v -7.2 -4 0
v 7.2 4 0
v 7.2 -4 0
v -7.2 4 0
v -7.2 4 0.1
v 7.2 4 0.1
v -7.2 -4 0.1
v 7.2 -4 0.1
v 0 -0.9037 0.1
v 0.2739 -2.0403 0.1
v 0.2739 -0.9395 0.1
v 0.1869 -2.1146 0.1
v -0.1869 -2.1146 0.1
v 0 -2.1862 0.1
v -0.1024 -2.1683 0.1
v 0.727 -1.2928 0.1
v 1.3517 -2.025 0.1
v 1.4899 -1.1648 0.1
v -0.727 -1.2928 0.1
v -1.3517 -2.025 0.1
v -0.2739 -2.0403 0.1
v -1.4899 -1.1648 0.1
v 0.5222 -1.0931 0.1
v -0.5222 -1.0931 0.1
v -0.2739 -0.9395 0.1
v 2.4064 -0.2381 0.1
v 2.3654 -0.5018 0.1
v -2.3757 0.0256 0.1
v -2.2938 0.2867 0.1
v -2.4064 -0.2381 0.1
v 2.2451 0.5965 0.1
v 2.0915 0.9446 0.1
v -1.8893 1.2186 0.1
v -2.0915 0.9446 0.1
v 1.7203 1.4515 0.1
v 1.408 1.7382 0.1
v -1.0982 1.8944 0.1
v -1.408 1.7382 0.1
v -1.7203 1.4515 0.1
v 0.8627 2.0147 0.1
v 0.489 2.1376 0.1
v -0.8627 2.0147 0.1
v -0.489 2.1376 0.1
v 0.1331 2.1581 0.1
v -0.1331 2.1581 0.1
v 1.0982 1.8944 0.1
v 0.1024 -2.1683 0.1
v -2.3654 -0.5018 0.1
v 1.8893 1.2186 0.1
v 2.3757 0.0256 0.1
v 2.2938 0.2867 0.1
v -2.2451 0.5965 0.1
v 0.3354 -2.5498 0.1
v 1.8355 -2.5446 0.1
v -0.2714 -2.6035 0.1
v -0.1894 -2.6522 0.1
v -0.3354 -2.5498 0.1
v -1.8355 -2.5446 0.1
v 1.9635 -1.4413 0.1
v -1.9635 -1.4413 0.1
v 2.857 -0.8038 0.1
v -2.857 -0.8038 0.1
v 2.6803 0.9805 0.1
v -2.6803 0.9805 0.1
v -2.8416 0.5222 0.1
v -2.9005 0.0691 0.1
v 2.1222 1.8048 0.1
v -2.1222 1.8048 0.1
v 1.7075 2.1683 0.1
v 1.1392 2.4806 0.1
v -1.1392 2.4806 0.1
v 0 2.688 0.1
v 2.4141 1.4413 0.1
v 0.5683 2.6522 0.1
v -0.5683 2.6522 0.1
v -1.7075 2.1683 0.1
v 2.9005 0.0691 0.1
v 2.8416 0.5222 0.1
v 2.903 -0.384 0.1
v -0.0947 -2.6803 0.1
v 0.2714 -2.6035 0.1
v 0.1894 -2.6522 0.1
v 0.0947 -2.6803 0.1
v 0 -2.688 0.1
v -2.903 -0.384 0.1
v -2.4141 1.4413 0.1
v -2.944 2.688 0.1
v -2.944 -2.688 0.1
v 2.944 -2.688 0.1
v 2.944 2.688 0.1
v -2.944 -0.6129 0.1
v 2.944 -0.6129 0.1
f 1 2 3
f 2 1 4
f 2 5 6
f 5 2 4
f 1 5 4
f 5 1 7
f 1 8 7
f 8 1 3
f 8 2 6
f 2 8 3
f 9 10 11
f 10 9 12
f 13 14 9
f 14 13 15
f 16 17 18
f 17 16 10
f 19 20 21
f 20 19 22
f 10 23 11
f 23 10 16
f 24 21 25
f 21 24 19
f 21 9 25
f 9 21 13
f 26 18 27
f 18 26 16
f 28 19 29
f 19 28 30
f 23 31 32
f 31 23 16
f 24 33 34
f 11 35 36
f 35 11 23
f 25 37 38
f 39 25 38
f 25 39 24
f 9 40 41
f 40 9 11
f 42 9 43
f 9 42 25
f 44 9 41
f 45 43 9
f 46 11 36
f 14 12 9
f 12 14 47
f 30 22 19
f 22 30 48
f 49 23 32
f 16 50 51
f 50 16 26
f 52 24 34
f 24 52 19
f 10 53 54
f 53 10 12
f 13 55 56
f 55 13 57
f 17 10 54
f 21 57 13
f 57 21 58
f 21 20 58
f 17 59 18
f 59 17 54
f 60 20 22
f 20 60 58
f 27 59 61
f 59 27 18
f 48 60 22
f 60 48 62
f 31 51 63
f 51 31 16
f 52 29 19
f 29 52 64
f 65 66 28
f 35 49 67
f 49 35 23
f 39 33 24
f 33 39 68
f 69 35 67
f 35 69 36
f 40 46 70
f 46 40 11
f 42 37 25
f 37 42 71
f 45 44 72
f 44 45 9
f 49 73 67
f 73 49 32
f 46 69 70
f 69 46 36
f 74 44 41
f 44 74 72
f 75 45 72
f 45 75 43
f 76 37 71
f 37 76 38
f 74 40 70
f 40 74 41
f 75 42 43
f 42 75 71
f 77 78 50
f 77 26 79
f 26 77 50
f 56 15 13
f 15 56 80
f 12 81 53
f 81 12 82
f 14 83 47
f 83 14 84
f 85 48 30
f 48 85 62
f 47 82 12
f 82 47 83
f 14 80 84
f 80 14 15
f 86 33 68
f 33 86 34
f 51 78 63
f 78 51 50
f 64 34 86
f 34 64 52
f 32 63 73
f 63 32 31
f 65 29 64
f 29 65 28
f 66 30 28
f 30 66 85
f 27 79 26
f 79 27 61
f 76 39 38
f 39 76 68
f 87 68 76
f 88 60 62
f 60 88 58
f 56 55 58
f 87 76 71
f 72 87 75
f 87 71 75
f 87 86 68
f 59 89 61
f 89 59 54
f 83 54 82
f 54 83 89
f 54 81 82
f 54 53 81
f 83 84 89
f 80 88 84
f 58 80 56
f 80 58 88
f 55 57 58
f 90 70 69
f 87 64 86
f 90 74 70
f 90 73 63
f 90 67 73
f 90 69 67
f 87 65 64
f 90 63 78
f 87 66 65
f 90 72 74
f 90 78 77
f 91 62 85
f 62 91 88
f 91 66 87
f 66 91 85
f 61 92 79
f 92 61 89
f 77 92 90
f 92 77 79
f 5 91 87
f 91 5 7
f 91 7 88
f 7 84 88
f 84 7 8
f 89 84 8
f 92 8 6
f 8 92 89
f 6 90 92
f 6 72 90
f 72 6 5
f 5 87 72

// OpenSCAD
// file: ../p/4-4edge.scad
use <../lib.scad>
$fa=1; $fs=0.2;
function ldraw_lib__4_4edge(realsolid=false) = [
// 0 Circle 1.0
// 0 Name: 4-4edge.dat
// 0 Author: James Jessiman
// 0 !LDRAW_ORG Primitive UPDATE 2017-01
// 0 !LICENSE Licensed under CC BY 2.0 and CC BY 4.0 : see CAreadme.txt
// 
// 0 BFC CERTIFY CCW
  [0,"BFC","CERTIFY"],
  [0,"BFC","CCW"],
// 
// 0 !HISTORY 1998-12-15 [PTadmin] Official Update 1998-10
// 0 !HISTORY 2005-12-28 [PTadmin] Official Update 2005-01
// 0 !HISTORY 2007-06-24 [PTadmin] Header formatted for Contributor Agreement
// 0 !HISTORY 2008-07-01 [PTadmin] Official Update 2008-01
// 0 !HISTORY 2017-01-15 [Steffen] BFCed
// 0 !HISTORY 2017-12-30 [PTadmin] Official Update 2017-01
// 
// 
// 2 24 1 0 0 0.9239 0 0.3827
  [2,24,1,0,0,0.9239,0,0.3827],
// 2 24 0.9239 0 0.3827 0.7071 0 0.7071
  [2,24,0.9239,0,0.3827,0.7071,0,0.7071],
// 2 24 0.7071 0 0.7071 0.3827 0 0.9239
  [2,24,0.7071,0,0.7071,0.3827,0,0.9239],
// 2 24 0.3827 0 0.9239 0 0 1
  [2,24,0.3827,0,0.9239,0,0,1],
// 2 24 0 0 1 -0.3827 0 0.9239
  [2,24,0,0,1,-0.3827,0,0.9239],
// 2 24 -0.3827 0 0.9239 -0.7071 0 0.7071
  [2,24,-0.3827,0,0.9239,-0.7071,0,0.7071],
// 2 24 -0.7071 0 0.7071 -0.9239 0 0.3827
  [2,24,-0.7071,0,0.7071,-0.9239,0,0.3827],
// 2 24 -0.9239 0 0.3827 -1 0 -0
  [2,24,-0.9239,0,0.3827,-1,0,-0],
// 2 24 -1 0 -0 -0.9239 0 -0.3827
  [2,24,-1,0,-0,-0.9239,0,-0.3827],
// 2 24 -0.9239 0 -0.3827 -0.7071 0 -0.7071
  [2,24,-0.9239,0,-0.3827,-0.7071,0,-0.7071],
// 2 24 -0.7071 0 -0.7071 -0.3827 0 -0.9239
  [2,24,-0.7071,0,-0.7071,-0.3827,0,-0.9239],
// 2 24 -0.3827 0 -0.9239 0 0 -1
  [2,24,-0.3827,0,-0.9239,0,0,-1],
// 2 24 0 0 -1 0.3827 0 -0.9239
  [2,24,0,0,-1,0.3827,0,-0.9239],
// 2 24 0.3827 0 -0.9239 0.7071 0 -0.7071
  [2,24,0.3827,0,-0.9239,0.7071,0,-0.7071],
// 2 24 0.7071 0 -0.7071 0.9239 0 -0.3827
  [2,24,0.7071,0,-0.7071,0.9239,0,-0.3827],
// 2 24 0.9239 0 -0.3827 1 0 0
  [2,24,0.9239,0,-0.3827,1,0,0],
];
module ldraw_lib__4_4edge(step=0, col=false, unit=2/5, alt=false, line=0.2, solid=!$preview)
    makepoly(ldraw_lib__4_4edge(solid), step=step, col=col, unit=unit, alt=alt, line=line, solid=solid);
ldraw_lib__4_4edge(line=0.2);
// file: ../p/4-4disc.scad
use <../lib.scad>
$fa=1; $fs=0.2;
function ldraw_lib__4_4disc(realsolid=false) = [
// 0 Disc 1.0
// 0 Name: 4-4disc.dat
// 0 Author: James Jessiman
// 0 !LDRAW_ORG Primitive UPDATE 2002-02
// 0 !LICENSE Licensed under CC BY 2.0 and CC BY 4.0 : see CAreadme.txt
// 
// 0 BFC CERTIFY CCW
  [0,"BFC","CERTIFY"],
  [0,"BFC","CCW"],
// 
// 0 !HISTORY 1998-12-15 [PTadmin] Official Update 1998-10
// 0 !HISTORY 2002-03-23 [sbliss] Added BFC statement
// 0 !HISTORY 2002-04-25 [PTadmin] Official Update 2002-02
// 0 !HISTORY 2007-06-24 [PTadmin] Header formatted for Contributor Agreement
// 0 !HISTORY 2008-07-01 [PTadmin] Official Update 2008-01
// 
// 
// 3 16 0 0 0 1 0 0 0.9239 0 0.3827
  [3,16,0,0,0,1,0,0,0.9239,0,0.3827],
// 3 16 0 0 0 0.9239 0 0.3827 0.7071 0 0.7071
  [3,16,0,0,0,0.9239,0,0.3827,0.7071,0,0.7071],
// 3 16 0 0 0 0.7071 0 0.7071 0.3827 0 0.9239
  [3,16,0,0,0,0.7071,0,0.7071,0.3827,0,0.9239],
// 3 16 0 0 0 0.3827 0 0.9239 0 0 1
  [3,16,0,0,0,0.3827,0,0.9239,0,0,1],
// 3 16 0 0 0 0 0 1 -0.3827 0 0.9239
  [3,16,0,0,0,0,0,1,-0.3827,0,0.9239],
// 3 16 0 0 0 -0.3827 0 0.9239 -0.7071 0 0.7071
  [3,16,0,0,0,-0.3827,0,0.9239,-0.7071,0,0.7071],
// 3 16 0 0 0 -0.7071 0 0.7071 -0.9239 0 0.3827
  [3,16,0,0,0,-0.7071,0,0.7071,-0.9239,0,0.3827],
// 3 16 0 0 0 -0.9239 0 0.3827 -1 0 -0
  [3,16,0,0,0,-0.9239,0,0.3827,-1,0,-0],
// 3 16 0 0 0 -1 0 -0 -0.9239 0 -0.3827
  [3,16,0,0,0,-1,0,-0,-0.9239,0,-0.3827],
// 3 16 0 0 0 -0.9239 0 -0.3827 -0.7071 0 -0.7071
  [3,16,0,0,0,-0.9239,0,-0.3827,-0.7071,0,-0.7071],
// 3 16 0 0 0 -0.7071 0 -0.7071 -0.3827 0 -0.9239
  [3,16,0,0,0,-0.7071,0,-0.7071,-0.3827,0,-0.9239],
// 3 16 0 0 0 -0.3827 0 -0.9239 0 0 -1
  [3,16,0,0,0,-0.3827,0,-0.9239,0,0,-1],
// 3 16 0 0 0 0 0 -1 0.3827 0 -0.9239
  [3,16,0,0,0,0,0,-1,0.3827,0,-0.9239],
// 3 16 0 0 0 0.3827 0 -0.9239 0.7071 0 -0.7071
  [3,16,0,0,0,0.3827,0,-0.9239,0.7071,0,-0.7071],
// 3 16 0 0 0 0.7071 0 -0.7071 0.9239 0 -0.3827
  [3,16,0,0,0,0.7071,0,-0.7071,0.9239,0,-0.3827],
// 3 16 0 0 0 0.9239 0 -0.3827 1 0 0
  [3,16,0,0,0,0.9239,0,-0.3827,1,0,0],
// 0
];
module ldraw_lib__4_4disc(step=0, col=false, unit=2/5, alt=false, line=0.2, solid=!$preview)
    makepoly(ldraw_lib__4_4disc(solid), step=step, col=col, unit=unit, alt=alt, line=line, solid=solid);
ldraw_lib__4_4disc(line=0.2);
// file: ../p/4-4cyli.scad
use <../lib.scad>
$fa=1; $fs=0.2;
function ldraw_lib__4_4cyli(realsolid=false) = [
// 0 Cylinder 1.0
// 0 Name: 4-4cyli.dat
// 0 Author: James Jessiman
// 0 !LDRAW_ORG Primitive UPDATE 2005-01
// 0 !LICENSE Licensed under CC BY 2.0 and CC BY 4.0 : see CAreadme.txt
// 
// 0 BFC CERTIFY CCW
  [0,"BFC","CERTIFY"],
  [0,"BFC","CCW"],
// 
// 0 !HISTORY 1998-12-15 [PTadmin] Official Update 1998-10
// 0 !HISTORY 2002-03-23 [sbliss] Added BFC statement; merged headers from files in distributions LDraw 0.27 and Complete.
// 0 !HISTORY 2002-04-25 [PTadmin] Official Update 2002-02
// 0 !HISTORY 2004-12-14 [guyvivan] BFC CCW
// 0 !HISTORY 2005-12-28 [PTadmin] Official Update 2005-01
// 0 !HISTORY 2007-06-24 [PTadmin] Header formatted for Contributor Agreement
// 0 !HISTORY 2008-07-01 [PTadmin] Official Update 2008-01
// 
// 
// 4 16 1 1 0 0.9239 1 0.3827 0.9239 0 0.3827 1 0 0
  [4,16,1,1,0,0.9239,1,0.3827,0.9239,0,0.3827,1,0,0],
// 5 24 1 0 0 1 1 0 0.9239 0 0.3827 0.9239 0 -0.3827
  [5,24,1,0,0,1,1,0,0.9239,0,0.3827,0.9239,0,-0.3827],
// 4 16 0.9239 1 0.3827 0.7071 1 0.7071 0.7071 0 0.7071 0.9239 0 0.3827
  [4,16,0.9239,1,0.3827,0.7071,1,0.7071,0.7071,0,0.7071,0.9239,0,0.3827],
// 5 24 0.9239 0 0.3827 0.9239 1 0.3827 0.7071 0 0.7071 1 0 0
  [5,24,0.9239,0,0.3827,0.9239,1,0.3827,0.7071,0,0.7071,1,0,0],
// 4 16 0.7071 1 0.7071 0.3827 1 0.9239 0.3827 0 0.9239 0.7071 0 0.7071
  [4,16,0.7071,1,0.7071,0.3827,1,0.9239,0.3827,0,0.9239,0.7071,0,0.7071],
// 5 24 0.7071 0 0.7071 0.7071 1 0.7071 0.3827 0 0.9239 0.9239 0 0.3827
  [5,24,0.7071,0,0.7071,0.7071,1,0.7071,0.3827,0,0.9239,0.9239,0,0.3827],
// 4 16 0.3827 1 0.9239 0 1 1 0 0 1 0.3827 0 0.9239
  [4,16,0.3827,1,0.9239,0,1,1,0,0,1,0.3827,0,0.9239],
// 5 24 0.3827 0 0.9239 0.3827 1 0.9239 0 0 1 0.7071 0 0.7071
  [5,24,0.3827,0,0.9239,0.3827,1,0.9239,0,0,1,0.7071,0,0.7071],
// 4 16 0 1 1 -0.3827 1 0.9239 -0.3827 0 0.9239 0 0 1
  [4,16,0,1,1,-0.3827,1,0.9239,-0.3827,0,0.9239,0,0,1],
// 5 24 0 0 1 0 1 1 -0.3827 0 0.9239 0.3827 0 0.9239
  [5,24,0,0,1,0,1,1,-0.3827,0,0.9239,0.3827,0,0.9239],
// 4 16 -0.3827 1 0.9239 -0.7071 1 0.7071 -0.7071 0 0.7071 -0.3827 0 0.9239
  [4,16,-0.3827,1,0.9239,-0.7071,1,0.7071,-0.7071,0,0.7071,-0.3827,0,0.9239],
// 5 24 -0.3827 0 0.9239 -0.3827 1 0.9239 -0.7071 0 0.7071 0 0 1
  [5,24,-0.3827,0,0.9239,-0.3827,1,0.9239,-0.7071,0,0.7071,0,0,1],
// 4 16 -0.7071 1 0.7071 -0.9239 1 0.3827 -0.9239 0 0.3827 -0.7071 0 0.7071
  [4,16,-0.7071,1,0.7071,-0.9239,1,0.3827,-0.9239,0,0.3827,-0.7071,0,0.7071],
// 5 24 -0.7071 0 0.7071 -0.7071 1 0.7071 -0.9239 0 0.3827 -0.3827 0 0.9239
  [5,24,-0.7071,0,0.7071,-0.7071,1,0.7071,-0.9239,0,0.3827,-0.3827,0,0.9239],
// 4 16 -0.9239 1 0.3827 -1 1 0 -1 0 0 -0.9239 0 0.3827
  [4,16,-0.9239,1,0.3827,-1,1,0,-1,0,0,-0.9239,0,0.3827],
// 5 24 -0.9239 0 0.3827 -0.9239 1 0.3827 -1 0 0 -0.7071 0 0.7071
  [5,24,-0.9239,0,0.3827,-0.9239,1,0.3827,-1,0,0,-0.7071,0,0.7071],
// 4 16 -1 1 0 -0.9239 1 -0.3827 -0.9239 0 -0.3827 -1 0 0
  [4,16,-1,1,0,-0.9239,1,-0.3827,-0.9239,0,-0.3827,-1,0,0],
// 5 24 -1 0 0 -1 1 0 -0.9239 0 -0.3827 -0.9239 0 0.3827
  [5,24,-1,0,0,-1,1,0,-0.9239,0,-0.3827,-0.9239,0,0.3827],
// 4 16 -0.9239 1 -0.3827 -0.7071 1 -0.7071 -0.7071 0 -0.7071 -0.9239 0 -0.3827
  [4,16,-0.9239,1,-0.3827,-0.7071,1,-0.7071,-0.7071,0,-0.7071,-0.9239,0,-0.3827],
// 5 24 -0.9239 0 -0.3827 -0.9239 1 -0.3827 -0.7071 0 -0.7071 -1 0 0
  [5,24,-0.9239,0,-0.3827,-0.9239,1,-0.3827,-0.7071,0,-0.7071,-1,0,0],
// 4 16 -0.7071 1 -0.7071 -0.3827 1 -0.9239 -0.3827 0 -0.9239 -0.7071 0 -0.7071
  [4,16,-0.7071,1,-0.7071,-0.3827,1,-0.9239,-0.3827,0,-0.9239,-0.7071,0,-0.7071],
// 5 24 -0.7071 0 -0.7071 -0.7071 1 -0.7071 -0.3827 0 -0.9239 -0.9239 0 -0.3827
  [5,24,-0.7071,0,-0.7071,-0.7071,1,-0.7071,-0.3827,0,-0.9239,-0.9239,0,-0.3827],
// 4 16 -0.3827 1 -0.9239 0 1 -1 0 0 -1 -0.3827 0 -0.9239
  [4,16,-0.3827,1,-0.9239,0,1,-1,0,0,-1,-0.3827,0,-0.9239],
// 5 24 -0.3827 0 -0.9239 -0.3827 1 -0.9239 0 0 -1 -0.7071 0 -0.7071
  [5,24,-0.3827,0,-0.9239,-0.3827,1,-0.9239,0,0,-1,-0.7071,0,-0.7071],
// 4 16 0 1 -1 0.3827 1 -0.9239 0.3827 0 -0.9239 0 0 -1
  [4,16,0,1,-1,0.3827,1,-0.9239,0.3827,0,-0.9239,0,0,-1],
// 5 24 0 0 -1 0 1 -1 0.3827 0 -0.9239 -0.3827 0 -0.9239
  [5,24,0,0,-1,0,1,-1,0.3827,0,-0.9239,-0.3827,0,-0.9239],
// 4 16 0.3827 1 -0.9239 0.7071 1 -0.7071 0.7071 0 -0.7071 0.3827 0 -0.9239
  [4,16,0.3827,1,-0.9239,0.7071,1,-0.7071,0.7071,0,-0.7071,0.3827,0,-0.9239],
// 5 24 0.3827 0 -0.9239 0.3827 1 -0.9239 0.7071 0 -0.7071 0 0 -1
  [5,24,0.3827,0,-0.9239,0.3827,1,-0.9239,0.7071,0,-0.7071,0,0,-1],
// 4 16 0.7071 1 -0.7071 0.9239 1 -0.3827 0.9239 0 -0.3827 0.7071 0 -0.7071
  [4,16,0.7071,1,-0.7071,0.9239,1,-0.3827,0.9239,0,-0.3827,0.7071,0,-0.7071],
// 5 24 0.7071 0 -0.7071 0.7071 1 -0.7071 0.9239 0 -0.3827 0.3827 0 -0.9239
  [5,24,0.7071,0,-0.7071,0.7071,1,-0.7071,0.9239,0,-0.3827,0.3827,0,-0.9239],
// 4 16 0.9239 1 -0.3827 1 1 0 1 0 0 0.9239 0 -0.3827
  [4,16,0.9239,1,-0.3827,1,1,0,1,0,0,0.9239,0,-0.3827],
// 5 24 0.9239 0 -0.3827 0.9239 1 -0.3827 1 0 0 0.7071 0 -0.7071
  [5,24,0.9239,0,-0.3827,0.9239,1,-0.3827,1,0,0,0.7071,0,-0.7071],
// 0
];
module ldraw_lib__4_4cyli(step=0, col=false, unit=2/5, alt=false, line=0.2, solid=!$preview)
    makepoly(ldraw_lib__4_4cyli(solid), step=step, col=col, unit=unit, alt=alt, line=line, solid=solid);
ldraw_lib__4_4cyli(line=0.2);
// file: ../p/stud3.scad
use <../lib.scad>
use <4-4cyli.scad>
use <4-4disc.scad>
use <4-4edge.scad>
$fa=1; $fs=0.2;
function ldraw_lib__stud3(realsolid=false) = realsolid ? 
    [openscad(translate([0,0,-eps()], o=cylinder(4+eps(), r=4)),2)] : [
// 0 Stud Tube Solid
// 0 Name: stud3.dat
// 0 Author: James Jessiman
// 0 !LDRAW_ORG Primitive UPDATE 2012-01
// 0 !LICENSE Licensed under CC BY 2.0 and CC BY 4.0 : see CAreadme.txt
// 
// 0 BFC CERTIFY CCW
  [0,"BFC","CERTIFY"],
  [0,"BFC","CCW"],
// 
// 0 !HISTORY 2002-04-04 [sbliss] Modified for BFC compliance
// 0 !HISTORY 2002-04-25 [PTadmin] Official Update 2002-02
// 0 !HISTORY 2007-06-24 [PTadmin] Header formatted for Contributor Agreement
// 0 !HISTORY 2008-07-01 [PTadmin] Official Update 2008-01
// 0 !HISTORY 2012-02-16 [Philo] Changed to CCW
// 0 !HISTORY 2012-03-30 [PTadmin] Official Update 2012-01
// 
// 
// 1 16 0 -4 0 4 0 0 0 1 0 0 0 4 4-4edge.dat
  [1,16,0,-4,0,4,0,0,0,1,0,0,0,4, ldraw_lib__4_4edge(realsolid)],
// 1 16 0 0 0 4 0 0 0 1 0 0 0 4 4-4edge.dat
  [1,16,0,0,0,4,0,0,0,1,0,0,0,4, ldraw_lib__4_4edge(realsolid)],
// 1 16 0 -4 0 4 0 0 0 1 0 0 0 4 4-4disc.dat
  [1,16,0,-4,0,4,0,0,0,1,0,0,0,4, ldraw_lib__4_4disc(realsolid)],
// 1 16 0 -4 0 4 0 0 0 4 0 0 0 4 4-4cyli.dat
  [1,16,0,-4,0,4,0,0,0,4,0,0,0,4, ldraw_lib__4_4cyli(realsolid)],
];
module ldraw_lib__stud3(step=0, col=false, unit=2/5, alt=false, line=0.2, solid=!$preview)
    makepoly(ldraw_lib__stud3(solid), step=step, col=col, unit=unit, alt=alt, line=line, solid=solid);
ldraw_lib__stud3(line=0.2);
// file: ../p/stud.scad
use <../lib.scad>
use <4-4cyli.scad>
use <4-4disc.scad>
use <4-4edge.scad>
$fa=1; $fs=0.2;
function ldraw_lib__stud(realsolid=false) = realsolid ? 
    [openscad(translate([0,0,-eps()], o=cylinder(4+eps(), r=6)),2)] : [
// 0 Stud
// 0 Name: stud.dat
// 0 Author: James Jessiman
// 0 !LDRAW_ORG Primitive UPDATE 2012-01
// 0 !LICENSE Licensed under CC BY 2.0 and CC BY 4.0 : see CAreadme.txt
// 
// 0 BFC CERTIFY CCW
  [0,"BFC","CERTIFY"],
  [0,"BFC","CCW"],
// 
// 0 !HISTORY 2002-04-04 [sbliss] Modified for BFC compliance
// 0 !HISTORY 2002-04-25 [PTadmin] Official Update 2002-02
// 0 !HISTORY 2007-06-24 [PTadmin] Header formatted for Contributor Agreement
// 0 !HISTORY 2008-07-01 [PTadmin] Official Update 2008-01
// 0 !HISTORY 2012-02-16 [Philo] Changed to CCW
// 0 !HISTORY 2012-03-30 [PTadmin] Official Update 2012-01
// 
// 
// 1 16 0 0 0 6 0 0 0 1 0 0 0 6 4-4edge.dat
  [1,16,0,0,0,6,0,0,0,1,0,0,0,6, ldraw_lib__4_4edge(realsolid)],
// 1 16 0 -4 0 6 0 0 0 1 0 0 0 6 4-4edge.dat
  [1,16,0,-4,0,6,0,0,0,1,0,0,0,6, ldraw_lib__4_4edge(realsolid)],
// 1 16 0 0 0 6 0 0 0 -4 0 0 0 6 4-4cyli.dat
  [1,16,0,0,0,6,0,0,0,-4,0,0,0,6, ldraw_lib__4_4cyli(realsolid)],
// 1 16 0 -4 0 6 0 0 0 1 0 0 0 6 4-4disc.dat
  [1,16,0,-4,0,6,0,0,0,1,0,0,0,6, ldraw_lib__4_4disc(realsolid)],
];
module ldraw_lib__stud(step=0, col=false, unit=2/5, alt=false, line=0.2, solid=!$preview)
    makepoly(ldraw_lib__stud(solid), step=step, col=col, unit=unit, alt=alt, line=line, solid=solid);
ldraw_lib__stud(line=0.2);
// file: ../p/box5.scad
use <../lib.scad>
$fa=1; $fs=0.2;
function ldraw_lib__box5(realsolid=false) = [
// 0 Box with 5 Faces and All Edges
// 0 Name: box5.dat
// 0 Author: James Jessiman
// 0 !LDRAW_ORG Primitive UPDATE 2012-01
// 0 !LICENSE Licensed under CC BY 2.0 and CC BY 4.0 : see CAreadme.txt
// 
// 0 BFC CERTIFY CCW
  [0,"BFC","CERTIFY"],
  [0,"BFC","CCW"],
// 
// 0 !HISTORY 2002-04-03 [sbliss] Modified for BFC compliance
// 0 !HISTORY 2002-04-25 [PTadmin] Official Update 2002-02
// 0 !HISTORY 2007-06-24 [PTadmin] Header formatted for Contributor Agreement
// 0 !HISTORY 2008-07-01 [PTadmin] Official Update 2008-01
// 0 !HISTORY 2012-02-16 [Philo] Changed to CCW
// 0 !HISTORY 2012-03-30 [PTadmin] Official Update 2012-01
// 
// 
// 2 24 1 1 1 -1 1 1
  [2,24,1,1,1,-1,1,1],
// 2 24 -1 1 1 -1 1 -1
  [2,24,-1,1,1,-1,1,-1],
// 2 24 -1 1 -1 1 1 -1
  [2,24,-1,1,-1,1,1,-1],
// 2 24 1 1 -1 1 1 1
  [2,24,1,1,-1,1,1,1],
// 2 24 1 0 1 -1 0 1
  [2,24,1,0,1,-1,0,1],
// 2 24 -1 0 1 -1 0 -1
  [2,24,-1,0,1,-1,0,-1],
// 2 24 -1 0 -1 1 0 -1
  [2,24,-1,0,-1,1,0,-1],
// 2 24 1 0 -1 1 0 1
  [2,24,1,0,-1,1,0,1],
// 2 24 1 0 1 1 1 1
  [2,24,1,0,1,1,1,1],
// 2 24 -1 0 1 -1 1 1
  [2,24,-1,0,1,-1,1,1],
// 2 24 1 0 -1 1 1 -1
  [2,24,1,0,-1,1,1,-1],
// 2 24 -1 0 -1 -1 1 -1
  [2,24,-1,0,-1,-1,1,-1],
// 4 16 -1 1 1 1 1 1 1 1 -1 -1 1 -1
  [4,16,-1,1,1,1,1,1,1,1,-1,-1,1,-1],
// 4 16 -1 1 1 -1 0 1 1 0 1 1 1 1
  [4,16,-1,1,1,-1,0,1,1,0,1,1,1,1],
// 4 16 -1 1 -1 -1 0 -1 -1 0 1 -1 1 1
  [4,16,-1,1,-1,-1,0,-1,-1,0,1,-1,1,1],
// 4 16 1 1 -1 1 0 -1 -1 0 -1 -1 1 -1
  [4,16,1,1,-1,1,0,-1,-1,0,-1,-1,1,-1],
// 4 16 1 1 1 1 0 1 1 0 -1 1 1 -1
  [4,16,1,1,1,1,0,1,1,0,-1,1,1,-1],
];
module ldraw_lib__box5(step=0, col=false, unit=2/5, alt=false, line=0.2, solid=!$preview)
    makepoly(ldraw_lib__box5(solid), step=step, col=col, unit=unit, alt=alt, line=line, solid=solid);
ldraw_lib__box5(line=0.2);
// file: ../p/box4t.scad
use <../lib.scad>
$fa=1; $fs=0.2;
function ldraw_lib__box4t(realsolid=false) = [
// 0 Box with 4 Adjacent Faces and All Edges
// 0 Name: box4t.dat
// 0 Author: Tore Eriksson [Tore_Eriksson]
// 0 !LDRAW_ORG Primitive UPDATE 2003-02
// 0 !LICENSE Licensed under CC BY 2.0 and CC BY 4.0 : see CAreadme.txt
// 
// 0 BFC CERTIFY CCW
  [0,"BFC","CERTIFY"],
  [0,"BFC","CCW"],
// 
// 0 !HISTORY 1997-09-29 [PTadmin] Official Update 1997-15
// 0 !HISTORY 2002-08-31 [izanette] Modified with WINDZ for BFC compliance
// 0 !HISTORY 2003-08-01 [PTadmin] Official Update 2003-02
// 0 !HISTORY 2007-06-24 [PTadmin] Header formatted for Contributor Agreement
// 0 !HISTORY 2008-07-01 [PTadmin] Official Update 2008-01
// 
// 
// 2 24 1 1 1 -1 1 1
  [2,24,1,1,1,-1,1,1],
// 2 24 -1 1 1 -1 1 -1
  [2,24,-1,1,1,-1,1,-1],
// 2 24 -1 1 -1 1 1 -1
  [2,24,-1,1,-1,1,1,-1],
// 2 24 1 1 -1 1 1 1
  [2,24,1,1,-1,1,1,1],
// 2 24 1 0 1 -1 0 1
  [2,24,1,0,1,-1,0,1],
// 2 24 -1 0 1 -1 0 -1
  [2,24,-1,0,1,-1,0,-1],
// 2 24 -1 0 -1 1 0 -1
  [2,24,-1,0,-1,1,0,-1],
// 2 24 1 0 -1 1 0 1
  [2,24,1,0,-1,1,0,1],
// 2 24 1 0 1 1 1 1
  [2,24,1,0,1,1,1,1],
// 2 24 -1 0 1 -1 1 1
  [2,24,-1,0,1,-1,1,1],
// 2 24 1 0 -1 1 1 -1
  [2,24,1,0,-1,1,1,-1],
// 2 24 -1 0 -1 -1 1 -1
  [2,24,-1,0,-1,-1,1,-1],
// 4 16 1 1 1 1 1 -1 -1 1 -1 -1 1 1
  [4,16,1,1,1,1,1,-1,-1,1,-1,-1,1,1],
// 4 16 1 1 1 -1 1 1 -1 0 1 1 0 1
  [4,16,1,1,1,-1,1,1,-1,0,1,1,0,1],
// 4 16 -1 1 1 -1 1 -1 -1 0 -1 -1 0 1
  [4,16,-1,1,1,-1,1,-1,-1,0,-1,-1,0,1],
// 0 4 16 -1 1 -1 -1 0 -1 1 0 -1 1 1 -1
// 4 16 1 1 -1 1 1 1 1 0 1 1 0 -1
  [4,16,1,1,-1,1,1,1,1,0,1,1,0,-1],
// 0
];
module ldraw_lib__box4t(step=0, col=false, unit=2/5, alt=false, line=0.2, solid=!$preview)
    makepoly(ldraw_lib__box4t(solid), step=step, col=col, unit=unit, alt=alt, line=line, solid=solid);
ldraw_lib__box4t(line=0.2);
// file: s/3004s01.scad
use <../../lib.scad>
use <../../p/box4t.scad>
use <../../p/box5.scad>
use <../../p/stud.scad>
use <../../p/stud3.scad>
$fa=1; $fs=0.2;
function ldraw_lib__s__3004s01(realsolid=false) = [
// 0 ~Brick  1 x  2 without Front Face
// 0 Name: s\3004s01.dat
// 0 Author: James Jessiman
// 0 !LDRAW_ORG Subpart UPDATE 2003-03
// 0 !LICENSE Licensed under CC BY 2.0 and CC BY 4.0 : see CAreadme.txt
// 
// 0 BFC CERTIFY CCW
  [0,"BFC","CERTIFY"],
  [0,"BFC","CCW"],
// 
// 0 !HISTORY 2003-09-07 [jriley] Subfiling, BFC
// 0 !HISTORY 2003-12-19 [PTadmin] Official Update 2003-03
// 0 !HISTORY 2007-08-29 [PTadmin] Header formatted for Contributor Agreement
// 0 !HISTORY 2008-07-01 [PTadmin] Official Update 2008-01
// 
// 
// 1 16 0 4 0 1 0 0 0 -5 0 0 0 1 stud3.dat
  [1,16,0,4,0,1,0,0,0,-5,0,0,0,1, ldraw_lib__stud3(realsolid)],
// 0 BFC INVERTNEXT
  [0,"BFC","INVERTNEXT"],
// 1 16 0 24 0 16 0 0 0 -20 0 0 0 6 box5.dat
  [1,16,0,24,0,16,0,0,0,-20,0,0,0,6, ldraw_lib__box5(realsolid)],
// 4 16 20 24 10 16 24 6 -16 24 6 -20 24 10
  [4,16,20,24,10,16,24,6,-16,24,6,-20,24,10],
// 4 16 -20 24 10 -16 24 6 -16 24 -6 -20 24 -10
  [4,16,-20,24,10,-16,24,6,-16,24,-6,-20,24,-10],
// 4 16 -20 24 -10 -16 24 -6 16 24 -6 20 24 -10
  [4,16,-20,24,-10,-16,24,-6,16,24,-6,20,24,-10],
// 4 16 20 24 -10 16 24 -6 16 24 6 20 24 10
  [4,16,20,24,-10,16,24,-6,16,24,6,20,24,10],
// 1 16 0 24 0 20 0 0 0 -24 0 0 0 10 box4t.dat
  [1,16,0,24,0,20,0,0,0,-24,0,0,0,10, ldraw_lib__box4t(realsolid)],
// 1 16 10 0 0 1 0 0 0 1 0 0 0 1 stud.dat
  [1,16,10,0,0,1,0,0,0,1,0,0,0,1, ldraw_lib__stud(realsolid)],
// 1 16 -10 0 0 1 0 0 0 1 0 0 0 1 stud.dat
  [1,16,-10,0,0,1,0,0,0,1,0,0,0,1, ldraw_lib__stud(realsolid)],
// 0
];
module ldraw_lib__s__3004s01(step=0, col=false, unit=2/5, alt=false, line=0.2, solid=!$preview)
    makepoly(ldraw_lib__s__3004s01(solid), step=step, col=col, unit=unit, alt=alt, line=line, solid=solid);
ldraw_lib__s__3004s01(line=0.2);
// file: 3004.scad
use <../lib.scad>
use <s/3004s01.scad>
$fa=1; $fs=0.2;
function ldraw_lib__3004(realsolid=false) = [
// 0 Brick  1 x  2
// 0 Name: 3004.dat
// 0 Author: James Jessiman
// 0 !LDRAW_ORG Part UPDATE 2022-05
// 0 !LICENSE Licensed under CC BY 2.0 and CC BY 4.0 : see CAreadme.txt
// 
// 0 BFC CERTIFY CCW
  [0,"BFC","CERTIFY"],
  [0,"BFC","CCW"],
// 
// 0 !HISTORY 2001-10-26 [PTadmin] Official Update 2001-01
// 0 !HISTORY 2002-05-07 {unknown} BFC Certification
// 0 !HISTORY 2002-06-11 [PTadmin] Official Update 2002-03
// 0 !HISTORY 2007-05-07 [PTadmin] Header formatted for Contributor Agreement
// 0 !HISTORY 2008-07-01 [PTadmin] Official Update 2008-01
// 0 !HISTORY 2022-08-04 [MagFors] Using subfile
// 0 !HISTORY 2022-09-15 [PTadmin] Official Update 2022-05
// 
// 
// 1 16 0 0 0 1 0 0 0 1 0 0 0 1 s\3004s01.dat
  [1,16,0,0,0,1,0,0,0,1,0,0,0,1, ldraw_lib__s__3004s01(realsolid)],
// 4 16 -20 24 -10 20 24 -10 20 0 -10 -20 0 -10
  [4,16,-20,24,-10,20,24,-10,20,0,-10,-20,0,-10],
];
module ldraw_lib__3004(step=0, col=false, unit=2/5, alt=false, line=0.2, solid=!$preview)
    makepoly(ldraw_lib__3004(solid), step=step, col=col, unit=unit, alt=alt, line=line, solid=solid);
ldraw_lib__3004(line=0.2);
// file: ../p/box5-12.scad
use <../lib.scad>
$fa=1; $fs=0.2;
function ldraw_lib__box5_12(realsolid=false) = [
// 0 Box with 5 Faces without Any Edges
// 0 Name: box5-12.dat
// 0 Author: Chris Dee [cwdee]
// 0 !LDRAW_ORG Primitive UPDATE 2009-02
// 0 !LICENSE Licensed under CC BY 2.0 and CC BY 4.0 : see CAreadme.txt
// 
// 0 BFC CERTIFY CCW
  [0,"BFC","CERTIFY"],
  [0,"BFC","CCW"],
// 
// 0 !HISTORY 2009-09-03 [PTadmin] Official Update 2009-02
// 
// 
// 4 16 1 1 1 1 1 -1 -1 1 -1 -1 1 1
  [4,16,1,1,1,1,1,-1,-1,1,-1,-1,1,1],
// 4 16 -1 0 1 1 0 1 1 1 1 -1 1 1
  [4,16,-1,0,1,1,0,1,1,1,1,-1,1,1],
// 4 16 -1 0 -1 -1 0 1 -1 1 1 -1 1 -1
  [4,16,-1,0,-1,-1,0,1,-1,1,1,-1,1,-1],
// 4 16 1 0 -1 -1 0 -1 -1 1 -1 1 1 -1
  [4,16,1,0,-1,-1,0,-1,-1,1,-1,1,1,-1],
// 4 16 1 0 1 1 0 -1 1 1 -1 1 1 1
  [4,16,1,0,1,1,0,-1,1,1,-1,1,1,1],
// 0
];
module ldraw_lib__box5_12(step=0, col=false, unit=2/5, alt=false, line=0.2, solid=!$preview)
    makepoly(ldraw_lib__box5_12(solid), step=step, col=col, unit=unit, alt=alt, line=line, solid=solid);
ldraw_lib__box5_12(line=0.2);
// main file
use <../lib.scad>
use <../p/box5-12.scad>
use <s/3004s60.scad>
$fa=1; $fs=0.2;
function ldraw_lib__190605a(realsolid=false) = [
// 0 Sticker  1.0 x  1.8 with Shell Logo White Background
// 0 Name: 190605a.dat
// 0 Author: Gerald Lasser [GeraldLasser]
// 0 !LDRAW_ORG Part UPDATE 2023-01
// 0 !LICENSE Licensed under CC BY 2.0 and CC BY 4.0 : see CAreadme.txt
// 
// 0 BFC CERTIFY CCW
  [0,"BFC","CERTIFY"],
  [0,"BFC","CCW"],
// 
// 0 !KEYWORDS Bricklink 7813stk01, Set 7813
// 
// 0 !HISTORY 2023-03-05 [OrionP] Official Update 2023-01
// 
// 
// 1 16 0 -.25 0 18 0 0 0 .25 0 0 0 10 box5-12.dat
  [1,16,0,-.25,0,18,0,0,0,.25,0,0,0,10, ldraw_lib__box5_12(realsolid)],
// 1 15 0 -.25 0 .64 0 0 0 0 1 0 -.64 0 s\3004s60.dat
  [1,15,0,-.25,0,.64,0,0,0,0,1,0,-.64,0, ldraw_lib__s__3004s60(realsolid)],
// 
// 4 15 -7.36 -.25 -1.53216 -7.36 -.25 6.72 -18 -.25 10 -18 -.25 -10
  [4,15,-7.36,-.25,-1.53216,-7.36,-.25,6.72,-18,-.25,10,-18,-.25,-10],
// 3 15 -7.36 -.25 -1.53216 -18 -.25 -10 -7.36 -.25 -6.72
  [3,15,-7.36,-.25,-1.53216,-18,-.25,-10,-7.36,-.25,-6.72],
// 4 15 0 -.25 -6.72 -7.36 -.25 -6.72 -18 -.25 -10 18 -.25 -10
  [4,15,0,-.25,-6.72,-7.36,-.25,-6.72,-18,-.25,-10,18,-.25,-10],
// 3 15 7.36 -.25 -6.72 0 -.25 -6.72 18 -.25 -10
  [3,15,7.36,-.25,-6.72,0,-.25,-6.72,18,-.25,-10],
// 4 15 7.36 -.25 -1.53216 7.36 -.25 -6.72 18 -.25 -10 18 -.25 10
  [4,15,7.36,-.25,-1.53216,7.36,-.25,-6.72,18,-.25,-10,18,-.25,10],
// 3 15 18 -.25 10 7.36 -.25 6.72 7.36 -.25 -1.53216
  [3,15,18,-.25,10,7.36,-.25,6.72,7.36,-.25,-1.53216],
// 4 15 0 -.25 6.72 7.36 -.25 6.72 18 -.25 10 -18 -.25 10
  [4,15,0,-.25,6.72,7.36,-.25,6.72,18,-.25,10,-18,-.25,10],
// 3 15 -18 -.25 10 -7.36 -.25 6.72 0 -.25 6.72
  [3,15,-18,-.25,10,-7.36,-.25,6.72,0,-.25,6.72],
];
module ldraw_lib__190605a(step=0, col=false, unit=2/5, alt=false, line=0.2, solid=!$preview)
    makepoly(ldraw_lib__190605a(solid), step=step, col=col, unit=unit, alt=alt, line=line, solid=solid);
ldraw_lib__190605a(line=0.2);
